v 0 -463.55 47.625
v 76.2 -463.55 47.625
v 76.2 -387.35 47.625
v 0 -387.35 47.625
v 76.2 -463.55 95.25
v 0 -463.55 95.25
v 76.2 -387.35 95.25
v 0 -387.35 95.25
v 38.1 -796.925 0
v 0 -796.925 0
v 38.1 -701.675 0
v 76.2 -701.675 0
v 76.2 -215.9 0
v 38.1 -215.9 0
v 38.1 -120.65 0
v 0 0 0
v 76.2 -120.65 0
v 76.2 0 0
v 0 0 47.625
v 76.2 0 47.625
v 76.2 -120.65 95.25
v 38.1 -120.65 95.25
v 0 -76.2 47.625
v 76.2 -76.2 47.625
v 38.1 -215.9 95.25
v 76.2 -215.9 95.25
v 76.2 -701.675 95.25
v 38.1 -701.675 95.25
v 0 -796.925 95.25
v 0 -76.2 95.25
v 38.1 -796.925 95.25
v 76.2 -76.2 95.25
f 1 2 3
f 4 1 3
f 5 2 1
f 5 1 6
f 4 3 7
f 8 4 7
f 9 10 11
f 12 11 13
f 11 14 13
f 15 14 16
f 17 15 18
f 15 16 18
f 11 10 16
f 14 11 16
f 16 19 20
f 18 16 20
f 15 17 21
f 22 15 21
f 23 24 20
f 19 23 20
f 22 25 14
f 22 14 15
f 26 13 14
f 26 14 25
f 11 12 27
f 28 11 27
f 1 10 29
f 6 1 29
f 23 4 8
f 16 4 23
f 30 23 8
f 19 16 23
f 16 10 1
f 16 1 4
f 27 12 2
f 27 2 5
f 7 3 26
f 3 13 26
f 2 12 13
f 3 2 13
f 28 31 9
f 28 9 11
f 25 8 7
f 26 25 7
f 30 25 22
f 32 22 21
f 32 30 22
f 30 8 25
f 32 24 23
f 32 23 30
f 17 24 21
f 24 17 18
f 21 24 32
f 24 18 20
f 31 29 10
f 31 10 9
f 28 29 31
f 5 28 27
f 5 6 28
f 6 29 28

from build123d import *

# Parameters (mm, degrees)
F0_W     = 76.2
F0_H     = 95.25
F1_DEPTH = 796.925
F2_W     = 95.25
F2_H     = 95.25
F3_DEPTH = 38.1
F4_W     = 76.2
F4_H     = 47.625
F5_DEPTH = 76.201
F6_W     = 95.25
F6_H     = 95.25
F7_DEPTH = 38.1


with BuildPart() as f1:
    # F0 (on Front) → F1 (new body)
    with BuildSketch(Plane.XZ):
        with Locations((38.1, 47.625)):
            Rectangle(F0_W, F0_H)
    extrude(amount=F1_DEPTH)

    # F2 (on face) → F3 (cut)
    with BuildSketch(Plane.YZ.offset(76.2)):
        with Locations((-749.3, 47.625)):
            Rectangle(F2_W, F2_H)
    extrude(amount=-F3_DEPTH, mode=Mode.SUBTRACT)

    # F4 (on face) → F5 (cut, through all)
    with BuildSketch(Plane.YZ.offset(76.2)):
        with Locations((-425.45, 71.4375)):
            Rectangle(F4_W, F4_H)
        with Locations((-38.1, 71.4375)):
            Rectangle(F4_W, F4_H)
    extrude(amount=-F5_DEPTH, mode=Mode.SUBTRACT)

    # F6 (on face) → F7 (cut)
    with BuildSketch(Plane.YZ.offset(76.2)):
        with Locations((-168.275, 47.625)):
            Rectangle(F6_W, F6_H)
    extrude(amount=-F7_DEPTH, mode=Mode.SUBTRACT)


solid = f1.part
